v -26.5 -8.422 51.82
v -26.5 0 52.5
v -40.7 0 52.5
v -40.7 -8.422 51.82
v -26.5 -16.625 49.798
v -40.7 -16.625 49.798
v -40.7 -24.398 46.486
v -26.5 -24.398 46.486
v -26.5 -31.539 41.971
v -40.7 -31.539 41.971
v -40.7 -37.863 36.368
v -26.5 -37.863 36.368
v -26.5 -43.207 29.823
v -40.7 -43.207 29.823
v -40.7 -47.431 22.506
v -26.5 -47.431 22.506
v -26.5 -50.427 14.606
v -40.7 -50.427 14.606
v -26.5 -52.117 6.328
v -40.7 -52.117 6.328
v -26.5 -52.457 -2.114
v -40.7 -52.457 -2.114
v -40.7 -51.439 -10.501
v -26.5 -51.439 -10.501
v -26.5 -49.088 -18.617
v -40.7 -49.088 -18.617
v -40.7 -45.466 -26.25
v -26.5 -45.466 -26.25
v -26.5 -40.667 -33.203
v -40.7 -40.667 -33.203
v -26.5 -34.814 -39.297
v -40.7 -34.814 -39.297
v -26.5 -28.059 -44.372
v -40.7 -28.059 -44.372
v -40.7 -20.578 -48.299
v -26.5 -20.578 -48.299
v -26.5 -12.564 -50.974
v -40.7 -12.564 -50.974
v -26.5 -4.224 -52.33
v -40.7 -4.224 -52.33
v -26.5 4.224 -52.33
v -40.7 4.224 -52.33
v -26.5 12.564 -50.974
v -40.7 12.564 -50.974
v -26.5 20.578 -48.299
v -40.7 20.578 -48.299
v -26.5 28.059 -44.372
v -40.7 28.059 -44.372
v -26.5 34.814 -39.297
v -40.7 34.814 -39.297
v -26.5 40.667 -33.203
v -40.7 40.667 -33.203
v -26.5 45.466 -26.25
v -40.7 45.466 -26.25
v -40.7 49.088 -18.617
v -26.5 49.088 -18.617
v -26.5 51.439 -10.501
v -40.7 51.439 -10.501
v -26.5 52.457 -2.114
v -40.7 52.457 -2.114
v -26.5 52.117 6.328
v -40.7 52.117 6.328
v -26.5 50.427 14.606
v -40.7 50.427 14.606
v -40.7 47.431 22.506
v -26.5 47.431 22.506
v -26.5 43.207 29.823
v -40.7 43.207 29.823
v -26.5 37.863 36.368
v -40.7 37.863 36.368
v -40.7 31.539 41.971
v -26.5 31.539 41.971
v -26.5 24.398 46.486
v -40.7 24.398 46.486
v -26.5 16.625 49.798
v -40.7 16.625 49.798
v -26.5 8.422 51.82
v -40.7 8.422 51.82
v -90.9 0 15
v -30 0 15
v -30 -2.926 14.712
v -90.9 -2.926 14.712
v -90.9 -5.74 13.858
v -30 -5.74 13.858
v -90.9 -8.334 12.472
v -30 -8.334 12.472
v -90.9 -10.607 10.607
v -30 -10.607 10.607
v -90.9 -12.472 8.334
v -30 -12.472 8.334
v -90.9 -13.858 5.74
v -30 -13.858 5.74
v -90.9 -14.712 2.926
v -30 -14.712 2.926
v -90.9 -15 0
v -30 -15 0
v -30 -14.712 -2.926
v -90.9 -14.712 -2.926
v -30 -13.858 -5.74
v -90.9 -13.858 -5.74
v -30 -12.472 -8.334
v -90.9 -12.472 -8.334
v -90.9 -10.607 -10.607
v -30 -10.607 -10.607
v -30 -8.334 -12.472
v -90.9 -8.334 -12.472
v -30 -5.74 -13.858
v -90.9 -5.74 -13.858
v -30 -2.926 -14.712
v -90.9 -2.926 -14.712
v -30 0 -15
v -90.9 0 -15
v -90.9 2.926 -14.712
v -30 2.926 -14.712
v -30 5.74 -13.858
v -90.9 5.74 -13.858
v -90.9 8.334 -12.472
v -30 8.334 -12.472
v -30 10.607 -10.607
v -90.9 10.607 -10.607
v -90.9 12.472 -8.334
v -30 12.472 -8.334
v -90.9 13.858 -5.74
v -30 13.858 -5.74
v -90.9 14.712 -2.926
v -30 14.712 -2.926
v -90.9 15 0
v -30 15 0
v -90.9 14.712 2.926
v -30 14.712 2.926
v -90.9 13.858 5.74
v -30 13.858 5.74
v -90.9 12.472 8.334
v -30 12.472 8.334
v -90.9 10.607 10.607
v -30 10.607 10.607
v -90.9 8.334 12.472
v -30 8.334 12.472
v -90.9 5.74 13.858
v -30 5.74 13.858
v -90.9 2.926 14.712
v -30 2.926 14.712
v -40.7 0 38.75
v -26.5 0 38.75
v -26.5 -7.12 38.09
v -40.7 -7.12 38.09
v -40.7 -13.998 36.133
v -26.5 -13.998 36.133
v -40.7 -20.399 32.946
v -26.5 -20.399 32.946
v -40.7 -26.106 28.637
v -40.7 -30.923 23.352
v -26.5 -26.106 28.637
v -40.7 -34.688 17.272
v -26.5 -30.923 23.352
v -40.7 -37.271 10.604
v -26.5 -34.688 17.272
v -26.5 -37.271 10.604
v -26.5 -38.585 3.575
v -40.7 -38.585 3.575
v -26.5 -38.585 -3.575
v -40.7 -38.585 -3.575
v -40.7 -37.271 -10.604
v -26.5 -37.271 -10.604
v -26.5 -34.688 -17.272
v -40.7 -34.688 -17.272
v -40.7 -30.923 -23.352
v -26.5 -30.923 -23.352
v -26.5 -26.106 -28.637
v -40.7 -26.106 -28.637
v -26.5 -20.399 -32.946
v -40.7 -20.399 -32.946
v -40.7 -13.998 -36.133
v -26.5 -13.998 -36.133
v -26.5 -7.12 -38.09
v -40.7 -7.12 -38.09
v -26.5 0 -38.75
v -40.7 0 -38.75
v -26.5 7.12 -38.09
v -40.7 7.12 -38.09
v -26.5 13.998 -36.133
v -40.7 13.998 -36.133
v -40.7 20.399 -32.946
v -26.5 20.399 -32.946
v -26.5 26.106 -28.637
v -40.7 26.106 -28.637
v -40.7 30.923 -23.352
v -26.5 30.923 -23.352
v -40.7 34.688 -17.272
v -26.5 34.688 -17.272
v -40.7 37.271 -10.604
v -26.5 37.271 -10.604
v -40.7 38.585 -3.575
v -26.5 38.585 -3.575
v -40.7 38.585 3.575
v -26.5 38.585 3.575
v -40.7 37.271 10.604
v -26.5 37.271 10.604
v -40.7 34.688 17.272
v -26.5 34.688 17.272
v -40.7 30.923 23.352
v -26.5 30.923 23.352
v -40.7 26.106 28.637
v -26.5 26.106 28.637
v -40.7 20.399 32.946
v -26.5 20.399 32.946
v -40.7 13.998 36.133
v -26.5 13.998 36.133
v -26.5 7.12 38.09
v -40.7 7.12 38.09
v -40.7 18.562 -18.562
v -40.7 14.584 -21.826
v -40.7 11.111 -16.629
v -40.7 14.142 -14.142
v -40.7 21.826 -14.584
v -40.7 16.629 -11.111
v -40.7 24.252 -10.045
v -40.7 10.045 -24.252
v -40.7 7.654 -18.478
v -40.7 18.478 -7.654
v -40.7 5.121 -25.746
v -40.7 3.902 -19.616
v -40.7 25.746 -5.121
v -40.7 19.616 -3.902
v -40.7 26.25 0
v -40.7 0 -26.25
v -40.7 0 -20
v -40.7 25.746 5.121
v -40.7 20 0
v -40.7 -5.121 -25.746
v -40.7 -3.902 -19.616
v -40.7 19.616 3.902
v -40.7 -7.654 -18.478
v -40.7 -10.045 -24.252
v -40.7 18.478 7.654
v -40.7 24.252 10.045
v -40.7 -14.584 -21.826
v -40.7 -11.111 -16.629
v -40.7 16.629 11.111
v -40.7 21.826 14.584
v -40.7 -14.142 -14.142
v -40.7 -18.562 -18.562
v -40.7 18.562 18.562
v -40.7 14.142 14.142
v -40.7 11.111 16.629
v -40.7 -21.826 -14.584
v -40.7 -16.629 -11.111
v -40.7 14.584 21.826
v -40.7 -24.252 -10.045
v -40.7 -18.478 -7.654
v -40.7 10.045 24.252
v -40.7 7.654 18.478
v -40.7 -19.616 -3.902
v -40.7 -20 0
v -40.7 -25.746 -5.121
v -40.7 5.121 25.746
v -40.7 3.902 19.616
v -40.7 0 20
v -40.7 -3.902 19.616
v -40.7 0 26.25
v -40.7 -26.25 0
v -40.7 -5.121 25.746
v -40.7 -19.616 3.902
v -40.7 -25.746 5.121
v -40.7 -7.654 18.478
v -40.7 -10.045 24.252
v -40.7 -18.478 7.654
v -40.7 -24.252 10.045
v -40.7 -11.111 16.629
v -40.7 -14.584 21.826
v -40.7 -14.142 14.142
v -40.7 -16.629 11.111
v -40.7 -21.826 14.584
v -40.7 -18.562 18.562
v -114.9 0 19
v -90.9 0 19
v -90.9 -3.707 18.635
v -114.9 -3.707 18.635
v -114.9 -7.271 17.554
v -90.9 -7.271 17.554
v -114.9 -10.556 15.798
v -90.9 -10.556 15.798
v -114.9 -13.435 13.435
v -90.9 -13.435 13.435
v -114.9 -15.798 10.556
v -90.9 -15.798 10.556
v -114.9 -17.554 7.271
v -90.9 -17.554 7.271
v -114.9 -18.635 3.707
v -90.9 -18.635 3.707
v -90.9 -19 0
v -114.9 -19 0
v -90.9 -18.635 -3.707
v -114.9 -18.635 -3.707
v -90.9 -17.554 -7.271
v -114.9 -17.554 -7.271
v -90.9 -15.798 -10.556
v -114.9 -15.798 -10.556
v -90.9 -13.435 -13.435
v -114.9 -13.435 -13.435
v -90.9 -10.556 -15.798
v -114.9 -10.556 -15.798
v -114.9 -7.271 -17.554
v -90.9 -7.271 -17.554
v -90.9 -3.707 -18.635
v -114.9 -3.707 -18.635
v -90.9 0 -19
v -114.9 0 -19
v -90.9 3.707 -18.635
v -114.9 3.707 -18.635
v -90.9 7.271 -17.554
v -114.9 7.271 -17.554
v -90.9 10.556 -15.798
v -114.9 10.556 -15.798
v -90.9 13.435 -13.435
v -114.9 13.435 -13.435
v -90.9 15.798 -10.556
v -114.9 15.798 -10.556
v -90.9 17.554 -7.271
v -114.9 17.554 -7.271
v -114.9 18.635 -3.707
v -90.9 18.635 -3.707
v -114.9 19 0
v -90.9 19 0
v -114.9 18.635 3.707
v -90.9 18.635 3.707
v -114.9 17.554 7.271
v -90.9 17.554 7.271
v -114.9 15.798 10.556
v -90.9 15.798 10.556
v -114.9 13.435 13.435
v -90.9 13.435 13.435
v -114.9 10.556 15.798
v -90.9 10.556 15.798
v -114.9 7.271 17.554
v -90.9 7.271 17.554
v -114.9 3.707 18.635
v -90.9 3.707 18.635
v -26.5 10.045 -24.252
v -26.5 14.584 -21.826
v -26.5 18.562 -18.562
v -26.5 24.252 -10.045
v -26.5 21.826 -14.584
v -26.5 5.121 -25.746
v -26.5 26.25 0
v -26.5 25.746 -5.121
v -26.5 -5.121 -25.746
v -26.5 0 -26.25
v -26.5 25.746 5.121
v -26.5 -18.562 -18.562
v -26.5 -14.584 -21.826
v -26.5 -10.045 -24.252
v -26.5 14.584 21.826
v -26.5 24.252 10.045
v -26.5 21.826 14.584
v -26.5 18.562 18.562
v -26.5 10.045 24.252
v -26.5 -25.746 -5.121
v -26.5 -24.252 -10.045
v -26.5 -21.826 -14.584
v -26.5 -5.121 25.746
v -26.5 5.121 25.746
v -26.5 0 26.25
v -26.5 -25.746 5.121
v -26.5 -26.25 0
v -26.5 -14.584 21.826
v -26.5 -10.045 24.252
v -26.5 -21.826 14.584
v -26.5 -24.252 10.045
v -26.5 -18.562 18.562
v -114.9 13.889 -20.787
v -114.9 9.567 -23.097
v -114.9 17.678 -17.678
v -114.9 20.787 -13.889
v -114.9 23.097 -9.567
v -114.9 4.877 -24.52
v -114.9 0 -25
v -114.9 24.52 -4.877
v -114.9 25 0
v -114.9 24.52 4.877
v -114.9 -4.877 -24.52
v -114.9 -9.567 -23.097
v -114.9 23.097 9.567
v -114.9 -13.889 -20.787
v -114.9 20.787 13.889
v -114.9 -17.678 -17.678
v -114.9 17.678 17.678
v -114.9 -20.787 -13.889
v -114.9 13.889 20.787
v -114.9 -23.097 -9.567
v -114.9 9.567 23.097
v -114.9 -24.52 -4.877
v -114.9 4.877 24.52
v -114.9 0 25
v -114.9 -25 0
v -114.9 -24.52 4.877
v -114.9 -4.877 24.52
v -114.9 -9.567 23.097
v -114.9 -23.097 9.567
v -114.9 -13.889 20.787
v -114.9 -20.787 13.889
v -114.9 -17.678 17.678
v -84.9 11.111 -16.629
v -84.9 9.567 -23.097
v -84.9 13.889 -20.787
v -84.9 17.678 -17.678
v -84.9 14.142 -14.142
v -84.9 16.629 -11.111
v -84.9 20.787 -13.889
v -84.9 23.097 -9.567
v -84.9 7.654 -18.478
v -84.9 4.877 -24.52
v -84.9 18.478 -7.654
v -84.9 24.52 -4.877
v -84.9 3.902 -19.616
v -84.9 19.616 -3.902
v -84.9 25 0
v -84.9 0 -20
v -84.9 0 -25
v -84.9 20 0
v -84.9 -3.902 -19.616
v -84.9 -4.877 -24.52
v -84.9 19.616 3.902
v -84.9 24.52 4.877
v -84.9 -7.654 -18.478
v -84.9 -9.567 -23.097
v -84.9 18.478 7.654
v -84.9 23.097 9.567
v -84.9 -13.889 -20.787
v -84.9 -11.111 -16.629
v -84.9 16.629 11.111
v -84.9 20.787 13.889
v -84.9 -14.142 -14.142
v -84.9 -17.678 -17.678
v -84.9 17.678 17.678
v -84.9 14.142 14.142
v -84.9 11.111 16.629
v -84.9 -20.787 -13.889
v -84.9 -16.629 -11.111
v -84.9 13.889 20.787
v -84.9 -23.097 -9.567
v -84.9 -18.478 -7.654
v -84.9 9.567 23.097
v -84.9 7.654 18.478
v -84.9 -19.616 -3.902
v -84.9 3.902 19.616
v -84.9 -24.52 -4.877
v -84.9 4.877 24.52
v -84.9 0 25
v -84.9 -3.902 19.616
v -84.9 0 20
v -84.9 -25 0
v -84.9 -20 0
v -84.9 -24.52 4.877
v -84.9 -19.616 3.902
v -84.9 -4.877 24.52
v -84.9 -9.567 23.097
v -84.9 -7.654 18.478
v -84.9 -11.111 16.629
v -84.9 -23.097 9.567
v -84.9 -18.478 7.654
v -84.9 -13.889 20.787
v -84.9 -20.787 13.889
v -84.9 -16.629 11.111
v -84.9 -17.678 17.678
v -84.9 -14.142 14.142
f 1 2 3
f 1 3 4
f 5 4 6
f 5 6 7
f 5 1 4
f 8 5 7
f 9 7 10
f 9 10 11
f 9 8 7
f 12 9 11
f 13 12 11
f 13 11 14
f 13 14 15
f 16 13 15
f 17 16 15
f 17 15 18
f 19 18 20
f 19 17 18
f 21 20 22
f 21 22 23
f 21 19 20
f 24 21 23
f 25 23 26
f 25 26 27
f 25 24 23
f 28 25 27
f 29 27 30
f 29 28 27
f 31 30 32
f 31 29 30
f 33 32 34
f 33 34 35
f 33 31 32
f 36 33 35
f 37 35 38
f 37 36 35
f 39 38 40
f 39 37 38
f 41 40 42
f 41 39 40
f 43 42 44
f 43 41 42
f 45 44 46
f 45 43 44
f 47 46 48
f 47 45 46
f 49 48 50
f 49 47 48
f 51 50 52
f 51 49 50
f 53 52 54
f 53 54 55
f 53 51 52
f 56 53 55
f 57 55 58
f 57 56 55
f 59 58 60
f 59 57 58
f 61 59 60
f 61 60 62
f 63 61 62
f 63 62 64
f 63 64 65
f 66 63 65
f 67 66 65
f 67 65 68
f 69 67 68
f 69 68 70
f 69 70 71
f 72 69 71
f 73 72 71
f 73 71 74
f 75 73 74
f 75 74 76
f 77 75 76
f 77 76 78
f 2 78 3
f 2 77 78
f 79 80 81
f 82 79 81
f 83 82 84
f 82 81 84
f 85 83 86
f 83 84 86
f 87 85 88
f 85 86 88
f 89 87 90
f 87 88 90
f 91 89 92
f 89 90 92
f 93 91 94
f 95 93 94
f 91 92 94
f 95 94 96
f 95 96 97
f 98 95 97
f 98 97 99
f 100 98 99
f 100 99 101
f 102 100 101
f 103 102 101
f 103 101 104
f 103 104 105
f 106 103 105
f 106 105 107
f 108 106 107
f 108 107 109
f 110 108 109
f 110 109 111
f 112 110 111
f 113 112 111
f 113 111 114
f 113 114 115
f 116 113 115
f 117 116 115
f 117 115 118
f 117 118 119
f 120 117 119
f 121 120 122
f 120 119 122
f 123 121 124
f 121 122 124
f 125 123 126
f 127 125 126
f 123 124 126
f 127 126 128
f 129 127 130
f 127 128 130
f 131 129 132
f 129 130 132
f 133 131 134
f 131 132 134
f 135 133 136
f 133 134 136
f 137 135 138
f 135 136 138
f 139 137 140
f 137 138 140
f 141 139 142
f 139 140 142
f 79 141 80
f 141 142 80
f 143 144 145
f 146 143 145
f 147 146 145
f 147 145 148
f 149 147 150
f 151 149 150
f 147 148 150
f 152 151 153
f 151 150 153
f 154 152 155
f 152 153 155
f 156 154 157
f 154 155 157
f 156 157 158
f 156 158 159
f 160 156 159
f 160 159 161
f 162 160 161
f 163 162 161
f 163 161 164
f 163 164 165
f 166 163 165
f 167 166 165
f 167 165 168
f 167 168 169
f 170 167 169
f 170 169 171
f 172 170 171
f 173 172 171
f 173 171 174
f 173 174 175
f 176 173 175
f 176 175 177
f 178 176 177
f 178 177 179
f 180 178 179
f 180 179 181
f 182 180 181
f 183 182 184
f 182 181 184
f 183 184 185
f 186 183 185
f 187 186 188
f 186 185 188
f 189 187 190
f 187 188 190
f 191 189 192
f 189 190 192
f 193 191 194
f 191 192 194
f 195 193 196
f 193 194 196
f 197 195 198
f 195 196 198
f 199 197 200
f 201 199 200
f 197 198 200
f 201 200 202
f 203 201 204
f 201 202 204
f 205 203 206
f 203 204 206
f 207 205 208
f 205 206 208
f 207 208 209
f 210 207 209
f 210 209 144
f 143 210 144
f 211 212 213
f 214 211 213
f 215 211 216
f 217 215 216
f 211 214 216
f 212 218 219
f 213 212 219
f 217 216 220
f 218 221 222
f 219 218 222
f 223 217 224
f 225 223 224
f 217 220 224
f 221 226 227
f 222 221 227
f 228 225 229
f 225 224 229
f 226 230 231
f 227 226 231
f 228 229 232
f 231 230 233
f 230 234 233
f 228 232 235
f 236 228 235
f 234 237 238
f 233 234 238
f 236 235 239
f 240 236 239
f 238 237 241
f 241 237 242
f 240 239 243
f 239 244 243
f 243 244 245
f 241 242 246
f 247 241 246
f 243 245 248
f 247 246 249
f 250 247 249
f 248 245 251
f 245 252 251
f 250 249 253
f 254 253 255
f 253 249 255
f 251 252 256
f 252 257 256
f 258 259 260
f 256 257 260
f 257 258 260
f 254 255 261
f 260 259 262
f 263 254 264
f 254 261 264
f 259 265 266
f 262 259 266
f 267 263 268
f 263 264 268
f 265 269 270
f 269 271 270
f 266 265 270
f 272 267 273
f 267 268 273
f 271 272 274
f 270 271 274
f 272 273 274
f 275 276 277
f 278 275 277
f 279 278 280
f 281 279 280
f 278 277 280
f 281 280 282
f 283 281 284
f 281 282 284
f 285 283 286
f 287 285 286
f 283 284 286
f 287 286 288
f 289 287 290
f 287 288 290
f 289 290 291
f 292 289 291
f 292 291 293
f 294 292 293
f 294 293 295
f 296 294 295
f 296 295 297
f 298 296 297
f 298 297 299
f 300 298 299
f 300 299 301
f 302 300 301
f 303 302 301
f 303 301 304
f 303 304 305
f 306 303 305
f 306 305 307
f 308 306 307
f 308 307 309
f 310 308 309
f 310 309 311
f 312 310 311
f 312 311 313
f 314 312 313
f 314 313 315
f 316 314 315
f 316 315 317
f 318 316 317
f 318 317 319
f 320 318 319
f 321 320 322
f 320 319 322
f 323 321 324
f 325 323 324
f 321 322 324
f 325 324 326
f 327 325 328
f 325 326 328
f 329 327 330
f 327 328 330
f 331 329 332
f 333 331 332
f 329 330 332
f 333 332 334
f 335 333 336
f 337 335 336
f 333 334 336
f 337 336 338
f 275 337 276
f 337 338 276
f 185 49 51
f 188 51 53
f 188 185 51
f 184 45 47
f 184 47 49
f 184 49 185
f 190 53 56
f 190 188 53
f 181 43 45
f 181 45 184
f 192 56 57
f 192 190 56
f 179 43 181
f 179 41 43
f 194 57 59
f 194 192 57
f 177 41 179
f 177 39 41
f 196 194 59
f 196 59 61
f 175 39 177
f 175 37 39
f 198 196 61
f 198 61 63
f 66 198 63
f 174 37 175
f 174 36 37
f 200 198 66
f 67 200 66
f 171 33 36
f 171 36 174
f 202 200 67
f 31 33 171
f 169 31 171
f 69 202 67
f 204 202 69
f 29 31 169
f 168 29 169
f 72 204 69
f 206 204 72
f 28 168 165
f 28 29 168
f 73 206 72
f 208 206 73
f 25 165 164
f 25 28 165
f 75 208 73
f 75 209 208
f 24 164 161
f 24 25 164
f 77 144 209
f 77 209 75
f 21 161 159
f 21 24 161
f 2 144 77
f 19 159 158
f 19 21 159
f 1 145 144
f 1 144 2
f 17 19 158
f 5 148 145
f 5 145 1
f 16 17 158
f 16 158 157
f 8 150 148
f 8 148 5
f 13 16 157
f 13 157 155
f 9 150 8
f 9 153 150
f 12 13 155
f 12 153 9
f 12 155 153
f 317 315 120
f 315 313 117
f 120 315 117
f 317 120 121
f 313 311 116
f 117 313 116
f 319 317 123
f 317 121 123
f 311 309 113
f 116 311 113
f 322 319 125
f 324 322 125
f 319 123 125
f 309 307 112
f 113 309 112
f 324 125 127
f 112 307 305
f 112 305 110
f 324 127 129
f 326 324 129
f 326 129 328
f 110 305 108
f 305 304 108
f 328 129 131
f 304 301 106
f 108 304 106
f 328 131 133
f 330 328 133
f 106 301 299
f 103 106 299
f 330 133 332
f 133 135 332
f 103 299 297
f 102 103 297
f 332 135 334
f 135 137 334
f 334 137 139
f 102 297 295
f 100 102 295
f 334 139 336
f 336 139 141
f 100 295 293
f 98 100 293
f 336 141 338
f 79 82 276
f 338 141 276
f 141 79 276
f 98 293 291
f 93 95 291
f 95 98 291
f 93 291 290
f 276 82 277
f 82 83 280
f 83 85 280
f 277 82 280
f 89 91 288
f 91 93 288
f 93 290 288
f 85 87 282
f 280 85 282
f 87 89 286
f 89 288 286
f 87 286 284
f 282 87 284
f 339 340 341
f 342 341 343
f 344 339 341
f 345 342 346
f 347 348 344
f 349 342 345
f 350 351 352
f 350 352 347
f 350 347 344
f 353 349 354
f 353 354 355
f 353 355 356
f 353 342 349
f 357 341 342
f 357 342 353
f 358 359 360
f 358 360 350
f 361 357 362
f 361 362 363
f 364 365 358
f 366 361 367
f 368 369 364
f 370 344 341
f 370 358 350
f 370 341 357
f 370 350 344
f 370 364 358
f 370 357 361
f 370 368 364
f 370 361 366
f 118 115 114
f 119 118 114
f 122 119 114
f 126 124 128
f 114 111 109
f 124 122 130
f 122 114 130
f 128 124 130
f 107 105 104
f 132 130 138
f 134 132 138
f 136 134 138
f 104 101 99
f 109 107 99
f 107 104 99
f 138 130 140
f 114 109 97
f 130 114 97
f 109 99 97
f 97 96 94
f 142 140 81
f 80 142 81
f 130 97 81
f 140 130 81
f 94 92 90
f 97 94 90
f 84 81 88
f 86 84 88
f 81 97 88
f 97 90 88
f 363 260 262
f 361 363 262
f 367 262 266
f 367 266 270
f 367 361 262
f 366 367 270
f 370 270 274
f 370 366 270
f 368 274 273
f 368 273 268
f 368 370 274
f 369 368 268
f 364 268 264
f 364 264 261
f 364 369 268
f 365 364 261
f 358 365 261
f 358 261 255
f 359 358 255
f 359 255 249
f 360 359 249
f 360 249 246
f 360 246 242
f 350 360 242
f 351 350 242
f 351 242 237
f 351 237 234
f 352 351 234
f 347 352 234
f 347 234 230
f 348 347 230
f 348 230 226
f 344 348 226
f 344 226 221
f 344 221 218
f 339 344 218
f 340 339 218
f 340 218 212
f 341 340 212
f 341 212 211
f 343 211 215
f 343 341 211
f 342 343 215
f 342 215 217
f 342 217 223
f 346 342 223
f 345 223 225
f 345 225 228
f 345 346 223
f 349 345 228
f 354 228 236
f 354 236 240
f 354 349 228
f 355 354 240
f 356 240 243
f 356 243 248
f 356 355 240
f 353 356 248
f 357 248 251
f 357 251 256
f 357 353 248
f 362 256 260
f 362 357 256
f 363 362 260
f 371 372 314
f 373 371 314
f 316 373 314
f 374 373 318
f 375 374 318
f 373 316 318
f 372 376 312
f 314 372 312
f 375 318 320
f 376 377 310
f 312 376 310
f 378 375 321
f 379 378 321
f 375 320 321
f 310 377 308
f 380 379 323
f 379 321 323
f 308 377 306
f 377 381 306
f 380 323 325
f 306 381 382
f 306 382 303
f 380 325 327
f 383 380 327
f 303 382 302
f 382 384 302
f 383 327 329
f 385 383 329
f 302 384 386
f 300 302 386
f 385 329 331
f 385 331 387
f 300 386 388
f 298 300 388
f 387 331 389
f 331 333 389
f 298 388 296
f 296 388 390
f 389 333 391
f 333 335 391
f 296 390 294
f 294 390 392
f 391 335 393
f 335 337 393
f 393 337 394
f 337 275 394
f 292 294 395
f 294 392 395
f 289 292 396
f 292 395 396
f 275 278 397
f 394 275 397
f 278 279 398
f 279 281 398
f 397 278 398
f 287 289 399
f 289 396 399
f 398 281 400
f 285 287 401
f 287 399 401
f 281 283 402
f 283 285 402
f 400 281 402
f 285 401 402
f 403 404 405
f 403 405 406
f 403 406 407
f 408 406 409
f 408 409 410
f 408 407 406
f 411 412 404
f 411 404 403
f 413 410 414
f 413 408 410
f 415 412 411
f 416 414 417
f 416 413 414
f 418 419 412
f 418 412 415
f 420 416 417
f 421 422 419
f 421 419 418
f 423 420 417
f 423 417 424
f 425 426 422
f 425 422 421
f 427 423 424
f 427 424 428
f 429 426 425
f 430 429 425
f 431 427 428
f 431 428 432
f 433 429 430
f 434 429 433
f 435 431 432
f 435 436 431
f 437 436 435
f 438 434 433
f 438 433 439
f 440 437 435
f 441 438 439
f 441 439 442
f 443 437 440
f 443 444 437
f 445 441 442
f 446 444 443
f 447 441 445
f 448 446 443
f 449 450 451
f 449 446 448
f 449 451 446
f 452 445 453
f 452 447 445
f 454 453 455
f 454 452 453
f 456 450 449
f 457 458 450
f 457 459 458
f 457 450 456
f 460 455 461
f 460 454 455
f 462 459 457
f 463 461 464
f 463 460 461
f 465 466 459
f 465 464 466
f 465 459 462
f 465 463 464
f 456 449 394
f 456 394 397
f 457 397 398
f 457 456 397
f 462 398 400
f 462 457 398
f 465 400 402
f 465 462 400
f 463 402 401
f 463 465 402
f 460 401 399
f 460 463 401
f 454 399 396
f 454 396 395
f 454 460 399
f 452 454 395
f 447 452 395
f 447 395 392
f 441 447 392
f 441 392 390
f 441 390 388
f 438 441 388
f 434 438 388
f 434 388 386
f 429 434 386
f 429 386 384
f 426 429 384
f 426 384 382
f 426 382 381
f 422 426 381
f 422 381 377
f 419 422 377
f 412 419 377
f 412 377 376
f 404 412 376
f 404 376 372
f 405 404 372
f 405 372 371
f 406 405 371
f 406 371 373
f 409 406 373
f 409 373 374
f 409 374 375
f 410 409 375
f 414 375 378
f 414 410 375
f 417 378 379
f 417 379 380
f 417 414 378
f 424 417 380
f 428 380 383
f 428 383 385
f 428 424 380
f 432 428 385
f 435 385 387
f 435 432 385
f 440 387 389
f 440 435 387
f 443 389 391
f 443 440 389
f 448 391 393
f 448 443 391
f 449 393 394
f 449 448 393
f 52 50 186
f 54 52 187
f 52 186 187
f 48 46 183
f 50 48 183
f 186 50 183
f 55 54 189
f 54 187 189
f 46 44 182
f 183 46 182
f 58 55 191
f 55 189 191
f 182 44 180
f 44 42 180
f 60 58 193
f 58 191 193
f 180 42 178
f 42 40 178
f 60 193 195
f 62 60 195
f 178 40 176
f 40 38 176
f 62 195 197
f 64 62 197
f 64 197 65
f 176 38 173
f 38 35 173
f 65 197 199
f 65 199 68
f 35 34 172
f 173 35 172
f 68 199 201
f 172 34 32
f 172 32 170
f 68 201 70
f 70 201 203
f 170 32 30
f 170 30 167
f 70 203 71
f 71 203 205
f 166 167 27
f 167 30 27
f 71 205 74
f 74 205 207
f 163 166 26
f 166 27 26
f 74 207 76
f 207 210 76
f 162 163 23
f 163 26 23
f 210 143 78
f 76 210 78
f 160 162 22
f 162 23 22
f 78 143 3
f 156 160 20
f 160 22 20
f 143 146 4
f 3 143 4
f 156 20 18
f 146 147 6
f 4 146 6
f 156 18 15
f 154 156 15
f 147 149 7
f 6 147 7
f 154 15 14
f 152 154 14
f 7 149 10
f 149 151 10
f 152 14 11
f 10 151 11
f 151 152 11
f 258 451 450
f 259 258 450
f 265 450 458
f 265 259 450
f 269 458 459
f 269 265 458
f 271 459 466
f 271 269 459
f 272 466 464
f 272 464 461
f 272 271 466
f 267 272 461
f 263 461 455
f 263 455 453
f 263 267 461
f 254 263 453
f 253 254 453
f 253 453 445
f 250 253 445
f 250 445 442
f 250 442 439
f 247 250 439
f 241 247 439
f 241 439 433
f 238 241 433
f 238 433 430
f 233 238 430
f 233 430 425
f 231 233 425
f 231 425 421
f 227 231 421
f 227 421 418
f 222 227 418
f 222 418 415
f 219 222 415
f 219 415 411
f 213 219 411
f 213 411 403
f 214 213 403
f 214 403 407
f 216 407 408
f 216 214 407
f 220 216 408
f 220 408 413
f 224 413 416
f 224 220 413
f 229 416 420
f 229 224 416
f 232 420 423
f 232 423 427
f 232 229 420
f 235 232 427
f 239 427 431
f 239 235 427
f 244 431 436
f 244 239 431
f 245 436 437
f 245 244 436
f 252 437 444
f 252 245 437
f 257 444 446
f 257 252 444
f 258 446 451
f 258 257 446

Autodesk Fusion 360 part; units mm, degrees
sketch "Sketch1" plane through (0, 0, 0) normal (0, 1, 0) x (1, 0, 0)
  line L0 (-125, 0) -> (145, 0) construction
  line L1 (-114.9, 0) -> (-114.9, -19)
  line L2 (-114.9, 0) -> (-114.9, -25)
  line L3 (-114.9, -19) -> (-90.9, -19)
  line L4 (-114.9, -25) -> (-84.9, -25)
  line L5 (-90.9, -19) -> (-90.9, -15)
  line L6 (-84.9, -25) -> (-84.9, -20)
  line L7 (-84.9, -20) -> (-40.7, -20)
  line L8 (-40.7, -20) -> (-40.7, 0) construction
  line L9 (-40.7, -20) -> (-40.7, -52.5)
  line L10 (-40.7, -52.5) -> (-26.5, -52.5)
  line L11 (-26.5, -52.5) -> (-26.5, 0)
  line L12 (-26.5, 0) -> (-30, 0)
  line L13 (-30, 0) -> (-30, -15)
  line L14 (-26.5, -18) -> (-27, -18)
  line L15 (-27, -18) -> (-30, -15)
  line L16 (-90.9, -15) -> (-26.5, -15)
  line L17 (-40.7, 0) -> (-40.7, -32.5) construction
  line L18 (-40.7, -32.5) -> (-12.9644, -32.5) construction
  line L19 (-40.7, -38.75) -> (-26.5, -38.75)
  line L20 (-40.7, -26.25) -> (-26.5, -26.25)
  point P0 (-30, -18)
  dimension "d5" = 19
  dimension "d6" = 25
  dimension "d7" = 24
  dimension "d8" = 30
  dimension "d9" = 4
  dimension "d10" = 5
  dimension "d11" = 44.2
  dimension "d12" = 32.5
  dimension "d13" = 14.2
  dimension "d14" = 3.5
  dimension "d15" = 3
  dimension "d16" = 3
  dimension "d17" = 32.5
  dimension "d18" = 6.25
revolve "Revolve1" add sketch "Sketch1" angle 360 about axis through (-125, 0, 0) along (1, 0, 0) contours L2 L3 L4 L5 L6 L7 L9 L11 L14 L15 L16 L20 | L11 L14 L15 L16 | L11 L12 L13 L16 | L9 L10 L11 L19 makes body 1 at (-31.2333, 5.2273, 52.2391) makes body 2 at (-50.3, 1.4935, 14.9255)
equation "d8 = 24 mm + 6 mm"
equation "d9 = 19 mm - 15 mm"
equation "d10 = 25 mm - 20 mm"
equation "d12 = ( 65 / 2 ) * 1 mm"
equation "d16 = d15"
equation "d17 = ( 65 / 2 ) * 1 mm"
equation "d18 = ( 12.5 / 2 ) * 1 mm"
